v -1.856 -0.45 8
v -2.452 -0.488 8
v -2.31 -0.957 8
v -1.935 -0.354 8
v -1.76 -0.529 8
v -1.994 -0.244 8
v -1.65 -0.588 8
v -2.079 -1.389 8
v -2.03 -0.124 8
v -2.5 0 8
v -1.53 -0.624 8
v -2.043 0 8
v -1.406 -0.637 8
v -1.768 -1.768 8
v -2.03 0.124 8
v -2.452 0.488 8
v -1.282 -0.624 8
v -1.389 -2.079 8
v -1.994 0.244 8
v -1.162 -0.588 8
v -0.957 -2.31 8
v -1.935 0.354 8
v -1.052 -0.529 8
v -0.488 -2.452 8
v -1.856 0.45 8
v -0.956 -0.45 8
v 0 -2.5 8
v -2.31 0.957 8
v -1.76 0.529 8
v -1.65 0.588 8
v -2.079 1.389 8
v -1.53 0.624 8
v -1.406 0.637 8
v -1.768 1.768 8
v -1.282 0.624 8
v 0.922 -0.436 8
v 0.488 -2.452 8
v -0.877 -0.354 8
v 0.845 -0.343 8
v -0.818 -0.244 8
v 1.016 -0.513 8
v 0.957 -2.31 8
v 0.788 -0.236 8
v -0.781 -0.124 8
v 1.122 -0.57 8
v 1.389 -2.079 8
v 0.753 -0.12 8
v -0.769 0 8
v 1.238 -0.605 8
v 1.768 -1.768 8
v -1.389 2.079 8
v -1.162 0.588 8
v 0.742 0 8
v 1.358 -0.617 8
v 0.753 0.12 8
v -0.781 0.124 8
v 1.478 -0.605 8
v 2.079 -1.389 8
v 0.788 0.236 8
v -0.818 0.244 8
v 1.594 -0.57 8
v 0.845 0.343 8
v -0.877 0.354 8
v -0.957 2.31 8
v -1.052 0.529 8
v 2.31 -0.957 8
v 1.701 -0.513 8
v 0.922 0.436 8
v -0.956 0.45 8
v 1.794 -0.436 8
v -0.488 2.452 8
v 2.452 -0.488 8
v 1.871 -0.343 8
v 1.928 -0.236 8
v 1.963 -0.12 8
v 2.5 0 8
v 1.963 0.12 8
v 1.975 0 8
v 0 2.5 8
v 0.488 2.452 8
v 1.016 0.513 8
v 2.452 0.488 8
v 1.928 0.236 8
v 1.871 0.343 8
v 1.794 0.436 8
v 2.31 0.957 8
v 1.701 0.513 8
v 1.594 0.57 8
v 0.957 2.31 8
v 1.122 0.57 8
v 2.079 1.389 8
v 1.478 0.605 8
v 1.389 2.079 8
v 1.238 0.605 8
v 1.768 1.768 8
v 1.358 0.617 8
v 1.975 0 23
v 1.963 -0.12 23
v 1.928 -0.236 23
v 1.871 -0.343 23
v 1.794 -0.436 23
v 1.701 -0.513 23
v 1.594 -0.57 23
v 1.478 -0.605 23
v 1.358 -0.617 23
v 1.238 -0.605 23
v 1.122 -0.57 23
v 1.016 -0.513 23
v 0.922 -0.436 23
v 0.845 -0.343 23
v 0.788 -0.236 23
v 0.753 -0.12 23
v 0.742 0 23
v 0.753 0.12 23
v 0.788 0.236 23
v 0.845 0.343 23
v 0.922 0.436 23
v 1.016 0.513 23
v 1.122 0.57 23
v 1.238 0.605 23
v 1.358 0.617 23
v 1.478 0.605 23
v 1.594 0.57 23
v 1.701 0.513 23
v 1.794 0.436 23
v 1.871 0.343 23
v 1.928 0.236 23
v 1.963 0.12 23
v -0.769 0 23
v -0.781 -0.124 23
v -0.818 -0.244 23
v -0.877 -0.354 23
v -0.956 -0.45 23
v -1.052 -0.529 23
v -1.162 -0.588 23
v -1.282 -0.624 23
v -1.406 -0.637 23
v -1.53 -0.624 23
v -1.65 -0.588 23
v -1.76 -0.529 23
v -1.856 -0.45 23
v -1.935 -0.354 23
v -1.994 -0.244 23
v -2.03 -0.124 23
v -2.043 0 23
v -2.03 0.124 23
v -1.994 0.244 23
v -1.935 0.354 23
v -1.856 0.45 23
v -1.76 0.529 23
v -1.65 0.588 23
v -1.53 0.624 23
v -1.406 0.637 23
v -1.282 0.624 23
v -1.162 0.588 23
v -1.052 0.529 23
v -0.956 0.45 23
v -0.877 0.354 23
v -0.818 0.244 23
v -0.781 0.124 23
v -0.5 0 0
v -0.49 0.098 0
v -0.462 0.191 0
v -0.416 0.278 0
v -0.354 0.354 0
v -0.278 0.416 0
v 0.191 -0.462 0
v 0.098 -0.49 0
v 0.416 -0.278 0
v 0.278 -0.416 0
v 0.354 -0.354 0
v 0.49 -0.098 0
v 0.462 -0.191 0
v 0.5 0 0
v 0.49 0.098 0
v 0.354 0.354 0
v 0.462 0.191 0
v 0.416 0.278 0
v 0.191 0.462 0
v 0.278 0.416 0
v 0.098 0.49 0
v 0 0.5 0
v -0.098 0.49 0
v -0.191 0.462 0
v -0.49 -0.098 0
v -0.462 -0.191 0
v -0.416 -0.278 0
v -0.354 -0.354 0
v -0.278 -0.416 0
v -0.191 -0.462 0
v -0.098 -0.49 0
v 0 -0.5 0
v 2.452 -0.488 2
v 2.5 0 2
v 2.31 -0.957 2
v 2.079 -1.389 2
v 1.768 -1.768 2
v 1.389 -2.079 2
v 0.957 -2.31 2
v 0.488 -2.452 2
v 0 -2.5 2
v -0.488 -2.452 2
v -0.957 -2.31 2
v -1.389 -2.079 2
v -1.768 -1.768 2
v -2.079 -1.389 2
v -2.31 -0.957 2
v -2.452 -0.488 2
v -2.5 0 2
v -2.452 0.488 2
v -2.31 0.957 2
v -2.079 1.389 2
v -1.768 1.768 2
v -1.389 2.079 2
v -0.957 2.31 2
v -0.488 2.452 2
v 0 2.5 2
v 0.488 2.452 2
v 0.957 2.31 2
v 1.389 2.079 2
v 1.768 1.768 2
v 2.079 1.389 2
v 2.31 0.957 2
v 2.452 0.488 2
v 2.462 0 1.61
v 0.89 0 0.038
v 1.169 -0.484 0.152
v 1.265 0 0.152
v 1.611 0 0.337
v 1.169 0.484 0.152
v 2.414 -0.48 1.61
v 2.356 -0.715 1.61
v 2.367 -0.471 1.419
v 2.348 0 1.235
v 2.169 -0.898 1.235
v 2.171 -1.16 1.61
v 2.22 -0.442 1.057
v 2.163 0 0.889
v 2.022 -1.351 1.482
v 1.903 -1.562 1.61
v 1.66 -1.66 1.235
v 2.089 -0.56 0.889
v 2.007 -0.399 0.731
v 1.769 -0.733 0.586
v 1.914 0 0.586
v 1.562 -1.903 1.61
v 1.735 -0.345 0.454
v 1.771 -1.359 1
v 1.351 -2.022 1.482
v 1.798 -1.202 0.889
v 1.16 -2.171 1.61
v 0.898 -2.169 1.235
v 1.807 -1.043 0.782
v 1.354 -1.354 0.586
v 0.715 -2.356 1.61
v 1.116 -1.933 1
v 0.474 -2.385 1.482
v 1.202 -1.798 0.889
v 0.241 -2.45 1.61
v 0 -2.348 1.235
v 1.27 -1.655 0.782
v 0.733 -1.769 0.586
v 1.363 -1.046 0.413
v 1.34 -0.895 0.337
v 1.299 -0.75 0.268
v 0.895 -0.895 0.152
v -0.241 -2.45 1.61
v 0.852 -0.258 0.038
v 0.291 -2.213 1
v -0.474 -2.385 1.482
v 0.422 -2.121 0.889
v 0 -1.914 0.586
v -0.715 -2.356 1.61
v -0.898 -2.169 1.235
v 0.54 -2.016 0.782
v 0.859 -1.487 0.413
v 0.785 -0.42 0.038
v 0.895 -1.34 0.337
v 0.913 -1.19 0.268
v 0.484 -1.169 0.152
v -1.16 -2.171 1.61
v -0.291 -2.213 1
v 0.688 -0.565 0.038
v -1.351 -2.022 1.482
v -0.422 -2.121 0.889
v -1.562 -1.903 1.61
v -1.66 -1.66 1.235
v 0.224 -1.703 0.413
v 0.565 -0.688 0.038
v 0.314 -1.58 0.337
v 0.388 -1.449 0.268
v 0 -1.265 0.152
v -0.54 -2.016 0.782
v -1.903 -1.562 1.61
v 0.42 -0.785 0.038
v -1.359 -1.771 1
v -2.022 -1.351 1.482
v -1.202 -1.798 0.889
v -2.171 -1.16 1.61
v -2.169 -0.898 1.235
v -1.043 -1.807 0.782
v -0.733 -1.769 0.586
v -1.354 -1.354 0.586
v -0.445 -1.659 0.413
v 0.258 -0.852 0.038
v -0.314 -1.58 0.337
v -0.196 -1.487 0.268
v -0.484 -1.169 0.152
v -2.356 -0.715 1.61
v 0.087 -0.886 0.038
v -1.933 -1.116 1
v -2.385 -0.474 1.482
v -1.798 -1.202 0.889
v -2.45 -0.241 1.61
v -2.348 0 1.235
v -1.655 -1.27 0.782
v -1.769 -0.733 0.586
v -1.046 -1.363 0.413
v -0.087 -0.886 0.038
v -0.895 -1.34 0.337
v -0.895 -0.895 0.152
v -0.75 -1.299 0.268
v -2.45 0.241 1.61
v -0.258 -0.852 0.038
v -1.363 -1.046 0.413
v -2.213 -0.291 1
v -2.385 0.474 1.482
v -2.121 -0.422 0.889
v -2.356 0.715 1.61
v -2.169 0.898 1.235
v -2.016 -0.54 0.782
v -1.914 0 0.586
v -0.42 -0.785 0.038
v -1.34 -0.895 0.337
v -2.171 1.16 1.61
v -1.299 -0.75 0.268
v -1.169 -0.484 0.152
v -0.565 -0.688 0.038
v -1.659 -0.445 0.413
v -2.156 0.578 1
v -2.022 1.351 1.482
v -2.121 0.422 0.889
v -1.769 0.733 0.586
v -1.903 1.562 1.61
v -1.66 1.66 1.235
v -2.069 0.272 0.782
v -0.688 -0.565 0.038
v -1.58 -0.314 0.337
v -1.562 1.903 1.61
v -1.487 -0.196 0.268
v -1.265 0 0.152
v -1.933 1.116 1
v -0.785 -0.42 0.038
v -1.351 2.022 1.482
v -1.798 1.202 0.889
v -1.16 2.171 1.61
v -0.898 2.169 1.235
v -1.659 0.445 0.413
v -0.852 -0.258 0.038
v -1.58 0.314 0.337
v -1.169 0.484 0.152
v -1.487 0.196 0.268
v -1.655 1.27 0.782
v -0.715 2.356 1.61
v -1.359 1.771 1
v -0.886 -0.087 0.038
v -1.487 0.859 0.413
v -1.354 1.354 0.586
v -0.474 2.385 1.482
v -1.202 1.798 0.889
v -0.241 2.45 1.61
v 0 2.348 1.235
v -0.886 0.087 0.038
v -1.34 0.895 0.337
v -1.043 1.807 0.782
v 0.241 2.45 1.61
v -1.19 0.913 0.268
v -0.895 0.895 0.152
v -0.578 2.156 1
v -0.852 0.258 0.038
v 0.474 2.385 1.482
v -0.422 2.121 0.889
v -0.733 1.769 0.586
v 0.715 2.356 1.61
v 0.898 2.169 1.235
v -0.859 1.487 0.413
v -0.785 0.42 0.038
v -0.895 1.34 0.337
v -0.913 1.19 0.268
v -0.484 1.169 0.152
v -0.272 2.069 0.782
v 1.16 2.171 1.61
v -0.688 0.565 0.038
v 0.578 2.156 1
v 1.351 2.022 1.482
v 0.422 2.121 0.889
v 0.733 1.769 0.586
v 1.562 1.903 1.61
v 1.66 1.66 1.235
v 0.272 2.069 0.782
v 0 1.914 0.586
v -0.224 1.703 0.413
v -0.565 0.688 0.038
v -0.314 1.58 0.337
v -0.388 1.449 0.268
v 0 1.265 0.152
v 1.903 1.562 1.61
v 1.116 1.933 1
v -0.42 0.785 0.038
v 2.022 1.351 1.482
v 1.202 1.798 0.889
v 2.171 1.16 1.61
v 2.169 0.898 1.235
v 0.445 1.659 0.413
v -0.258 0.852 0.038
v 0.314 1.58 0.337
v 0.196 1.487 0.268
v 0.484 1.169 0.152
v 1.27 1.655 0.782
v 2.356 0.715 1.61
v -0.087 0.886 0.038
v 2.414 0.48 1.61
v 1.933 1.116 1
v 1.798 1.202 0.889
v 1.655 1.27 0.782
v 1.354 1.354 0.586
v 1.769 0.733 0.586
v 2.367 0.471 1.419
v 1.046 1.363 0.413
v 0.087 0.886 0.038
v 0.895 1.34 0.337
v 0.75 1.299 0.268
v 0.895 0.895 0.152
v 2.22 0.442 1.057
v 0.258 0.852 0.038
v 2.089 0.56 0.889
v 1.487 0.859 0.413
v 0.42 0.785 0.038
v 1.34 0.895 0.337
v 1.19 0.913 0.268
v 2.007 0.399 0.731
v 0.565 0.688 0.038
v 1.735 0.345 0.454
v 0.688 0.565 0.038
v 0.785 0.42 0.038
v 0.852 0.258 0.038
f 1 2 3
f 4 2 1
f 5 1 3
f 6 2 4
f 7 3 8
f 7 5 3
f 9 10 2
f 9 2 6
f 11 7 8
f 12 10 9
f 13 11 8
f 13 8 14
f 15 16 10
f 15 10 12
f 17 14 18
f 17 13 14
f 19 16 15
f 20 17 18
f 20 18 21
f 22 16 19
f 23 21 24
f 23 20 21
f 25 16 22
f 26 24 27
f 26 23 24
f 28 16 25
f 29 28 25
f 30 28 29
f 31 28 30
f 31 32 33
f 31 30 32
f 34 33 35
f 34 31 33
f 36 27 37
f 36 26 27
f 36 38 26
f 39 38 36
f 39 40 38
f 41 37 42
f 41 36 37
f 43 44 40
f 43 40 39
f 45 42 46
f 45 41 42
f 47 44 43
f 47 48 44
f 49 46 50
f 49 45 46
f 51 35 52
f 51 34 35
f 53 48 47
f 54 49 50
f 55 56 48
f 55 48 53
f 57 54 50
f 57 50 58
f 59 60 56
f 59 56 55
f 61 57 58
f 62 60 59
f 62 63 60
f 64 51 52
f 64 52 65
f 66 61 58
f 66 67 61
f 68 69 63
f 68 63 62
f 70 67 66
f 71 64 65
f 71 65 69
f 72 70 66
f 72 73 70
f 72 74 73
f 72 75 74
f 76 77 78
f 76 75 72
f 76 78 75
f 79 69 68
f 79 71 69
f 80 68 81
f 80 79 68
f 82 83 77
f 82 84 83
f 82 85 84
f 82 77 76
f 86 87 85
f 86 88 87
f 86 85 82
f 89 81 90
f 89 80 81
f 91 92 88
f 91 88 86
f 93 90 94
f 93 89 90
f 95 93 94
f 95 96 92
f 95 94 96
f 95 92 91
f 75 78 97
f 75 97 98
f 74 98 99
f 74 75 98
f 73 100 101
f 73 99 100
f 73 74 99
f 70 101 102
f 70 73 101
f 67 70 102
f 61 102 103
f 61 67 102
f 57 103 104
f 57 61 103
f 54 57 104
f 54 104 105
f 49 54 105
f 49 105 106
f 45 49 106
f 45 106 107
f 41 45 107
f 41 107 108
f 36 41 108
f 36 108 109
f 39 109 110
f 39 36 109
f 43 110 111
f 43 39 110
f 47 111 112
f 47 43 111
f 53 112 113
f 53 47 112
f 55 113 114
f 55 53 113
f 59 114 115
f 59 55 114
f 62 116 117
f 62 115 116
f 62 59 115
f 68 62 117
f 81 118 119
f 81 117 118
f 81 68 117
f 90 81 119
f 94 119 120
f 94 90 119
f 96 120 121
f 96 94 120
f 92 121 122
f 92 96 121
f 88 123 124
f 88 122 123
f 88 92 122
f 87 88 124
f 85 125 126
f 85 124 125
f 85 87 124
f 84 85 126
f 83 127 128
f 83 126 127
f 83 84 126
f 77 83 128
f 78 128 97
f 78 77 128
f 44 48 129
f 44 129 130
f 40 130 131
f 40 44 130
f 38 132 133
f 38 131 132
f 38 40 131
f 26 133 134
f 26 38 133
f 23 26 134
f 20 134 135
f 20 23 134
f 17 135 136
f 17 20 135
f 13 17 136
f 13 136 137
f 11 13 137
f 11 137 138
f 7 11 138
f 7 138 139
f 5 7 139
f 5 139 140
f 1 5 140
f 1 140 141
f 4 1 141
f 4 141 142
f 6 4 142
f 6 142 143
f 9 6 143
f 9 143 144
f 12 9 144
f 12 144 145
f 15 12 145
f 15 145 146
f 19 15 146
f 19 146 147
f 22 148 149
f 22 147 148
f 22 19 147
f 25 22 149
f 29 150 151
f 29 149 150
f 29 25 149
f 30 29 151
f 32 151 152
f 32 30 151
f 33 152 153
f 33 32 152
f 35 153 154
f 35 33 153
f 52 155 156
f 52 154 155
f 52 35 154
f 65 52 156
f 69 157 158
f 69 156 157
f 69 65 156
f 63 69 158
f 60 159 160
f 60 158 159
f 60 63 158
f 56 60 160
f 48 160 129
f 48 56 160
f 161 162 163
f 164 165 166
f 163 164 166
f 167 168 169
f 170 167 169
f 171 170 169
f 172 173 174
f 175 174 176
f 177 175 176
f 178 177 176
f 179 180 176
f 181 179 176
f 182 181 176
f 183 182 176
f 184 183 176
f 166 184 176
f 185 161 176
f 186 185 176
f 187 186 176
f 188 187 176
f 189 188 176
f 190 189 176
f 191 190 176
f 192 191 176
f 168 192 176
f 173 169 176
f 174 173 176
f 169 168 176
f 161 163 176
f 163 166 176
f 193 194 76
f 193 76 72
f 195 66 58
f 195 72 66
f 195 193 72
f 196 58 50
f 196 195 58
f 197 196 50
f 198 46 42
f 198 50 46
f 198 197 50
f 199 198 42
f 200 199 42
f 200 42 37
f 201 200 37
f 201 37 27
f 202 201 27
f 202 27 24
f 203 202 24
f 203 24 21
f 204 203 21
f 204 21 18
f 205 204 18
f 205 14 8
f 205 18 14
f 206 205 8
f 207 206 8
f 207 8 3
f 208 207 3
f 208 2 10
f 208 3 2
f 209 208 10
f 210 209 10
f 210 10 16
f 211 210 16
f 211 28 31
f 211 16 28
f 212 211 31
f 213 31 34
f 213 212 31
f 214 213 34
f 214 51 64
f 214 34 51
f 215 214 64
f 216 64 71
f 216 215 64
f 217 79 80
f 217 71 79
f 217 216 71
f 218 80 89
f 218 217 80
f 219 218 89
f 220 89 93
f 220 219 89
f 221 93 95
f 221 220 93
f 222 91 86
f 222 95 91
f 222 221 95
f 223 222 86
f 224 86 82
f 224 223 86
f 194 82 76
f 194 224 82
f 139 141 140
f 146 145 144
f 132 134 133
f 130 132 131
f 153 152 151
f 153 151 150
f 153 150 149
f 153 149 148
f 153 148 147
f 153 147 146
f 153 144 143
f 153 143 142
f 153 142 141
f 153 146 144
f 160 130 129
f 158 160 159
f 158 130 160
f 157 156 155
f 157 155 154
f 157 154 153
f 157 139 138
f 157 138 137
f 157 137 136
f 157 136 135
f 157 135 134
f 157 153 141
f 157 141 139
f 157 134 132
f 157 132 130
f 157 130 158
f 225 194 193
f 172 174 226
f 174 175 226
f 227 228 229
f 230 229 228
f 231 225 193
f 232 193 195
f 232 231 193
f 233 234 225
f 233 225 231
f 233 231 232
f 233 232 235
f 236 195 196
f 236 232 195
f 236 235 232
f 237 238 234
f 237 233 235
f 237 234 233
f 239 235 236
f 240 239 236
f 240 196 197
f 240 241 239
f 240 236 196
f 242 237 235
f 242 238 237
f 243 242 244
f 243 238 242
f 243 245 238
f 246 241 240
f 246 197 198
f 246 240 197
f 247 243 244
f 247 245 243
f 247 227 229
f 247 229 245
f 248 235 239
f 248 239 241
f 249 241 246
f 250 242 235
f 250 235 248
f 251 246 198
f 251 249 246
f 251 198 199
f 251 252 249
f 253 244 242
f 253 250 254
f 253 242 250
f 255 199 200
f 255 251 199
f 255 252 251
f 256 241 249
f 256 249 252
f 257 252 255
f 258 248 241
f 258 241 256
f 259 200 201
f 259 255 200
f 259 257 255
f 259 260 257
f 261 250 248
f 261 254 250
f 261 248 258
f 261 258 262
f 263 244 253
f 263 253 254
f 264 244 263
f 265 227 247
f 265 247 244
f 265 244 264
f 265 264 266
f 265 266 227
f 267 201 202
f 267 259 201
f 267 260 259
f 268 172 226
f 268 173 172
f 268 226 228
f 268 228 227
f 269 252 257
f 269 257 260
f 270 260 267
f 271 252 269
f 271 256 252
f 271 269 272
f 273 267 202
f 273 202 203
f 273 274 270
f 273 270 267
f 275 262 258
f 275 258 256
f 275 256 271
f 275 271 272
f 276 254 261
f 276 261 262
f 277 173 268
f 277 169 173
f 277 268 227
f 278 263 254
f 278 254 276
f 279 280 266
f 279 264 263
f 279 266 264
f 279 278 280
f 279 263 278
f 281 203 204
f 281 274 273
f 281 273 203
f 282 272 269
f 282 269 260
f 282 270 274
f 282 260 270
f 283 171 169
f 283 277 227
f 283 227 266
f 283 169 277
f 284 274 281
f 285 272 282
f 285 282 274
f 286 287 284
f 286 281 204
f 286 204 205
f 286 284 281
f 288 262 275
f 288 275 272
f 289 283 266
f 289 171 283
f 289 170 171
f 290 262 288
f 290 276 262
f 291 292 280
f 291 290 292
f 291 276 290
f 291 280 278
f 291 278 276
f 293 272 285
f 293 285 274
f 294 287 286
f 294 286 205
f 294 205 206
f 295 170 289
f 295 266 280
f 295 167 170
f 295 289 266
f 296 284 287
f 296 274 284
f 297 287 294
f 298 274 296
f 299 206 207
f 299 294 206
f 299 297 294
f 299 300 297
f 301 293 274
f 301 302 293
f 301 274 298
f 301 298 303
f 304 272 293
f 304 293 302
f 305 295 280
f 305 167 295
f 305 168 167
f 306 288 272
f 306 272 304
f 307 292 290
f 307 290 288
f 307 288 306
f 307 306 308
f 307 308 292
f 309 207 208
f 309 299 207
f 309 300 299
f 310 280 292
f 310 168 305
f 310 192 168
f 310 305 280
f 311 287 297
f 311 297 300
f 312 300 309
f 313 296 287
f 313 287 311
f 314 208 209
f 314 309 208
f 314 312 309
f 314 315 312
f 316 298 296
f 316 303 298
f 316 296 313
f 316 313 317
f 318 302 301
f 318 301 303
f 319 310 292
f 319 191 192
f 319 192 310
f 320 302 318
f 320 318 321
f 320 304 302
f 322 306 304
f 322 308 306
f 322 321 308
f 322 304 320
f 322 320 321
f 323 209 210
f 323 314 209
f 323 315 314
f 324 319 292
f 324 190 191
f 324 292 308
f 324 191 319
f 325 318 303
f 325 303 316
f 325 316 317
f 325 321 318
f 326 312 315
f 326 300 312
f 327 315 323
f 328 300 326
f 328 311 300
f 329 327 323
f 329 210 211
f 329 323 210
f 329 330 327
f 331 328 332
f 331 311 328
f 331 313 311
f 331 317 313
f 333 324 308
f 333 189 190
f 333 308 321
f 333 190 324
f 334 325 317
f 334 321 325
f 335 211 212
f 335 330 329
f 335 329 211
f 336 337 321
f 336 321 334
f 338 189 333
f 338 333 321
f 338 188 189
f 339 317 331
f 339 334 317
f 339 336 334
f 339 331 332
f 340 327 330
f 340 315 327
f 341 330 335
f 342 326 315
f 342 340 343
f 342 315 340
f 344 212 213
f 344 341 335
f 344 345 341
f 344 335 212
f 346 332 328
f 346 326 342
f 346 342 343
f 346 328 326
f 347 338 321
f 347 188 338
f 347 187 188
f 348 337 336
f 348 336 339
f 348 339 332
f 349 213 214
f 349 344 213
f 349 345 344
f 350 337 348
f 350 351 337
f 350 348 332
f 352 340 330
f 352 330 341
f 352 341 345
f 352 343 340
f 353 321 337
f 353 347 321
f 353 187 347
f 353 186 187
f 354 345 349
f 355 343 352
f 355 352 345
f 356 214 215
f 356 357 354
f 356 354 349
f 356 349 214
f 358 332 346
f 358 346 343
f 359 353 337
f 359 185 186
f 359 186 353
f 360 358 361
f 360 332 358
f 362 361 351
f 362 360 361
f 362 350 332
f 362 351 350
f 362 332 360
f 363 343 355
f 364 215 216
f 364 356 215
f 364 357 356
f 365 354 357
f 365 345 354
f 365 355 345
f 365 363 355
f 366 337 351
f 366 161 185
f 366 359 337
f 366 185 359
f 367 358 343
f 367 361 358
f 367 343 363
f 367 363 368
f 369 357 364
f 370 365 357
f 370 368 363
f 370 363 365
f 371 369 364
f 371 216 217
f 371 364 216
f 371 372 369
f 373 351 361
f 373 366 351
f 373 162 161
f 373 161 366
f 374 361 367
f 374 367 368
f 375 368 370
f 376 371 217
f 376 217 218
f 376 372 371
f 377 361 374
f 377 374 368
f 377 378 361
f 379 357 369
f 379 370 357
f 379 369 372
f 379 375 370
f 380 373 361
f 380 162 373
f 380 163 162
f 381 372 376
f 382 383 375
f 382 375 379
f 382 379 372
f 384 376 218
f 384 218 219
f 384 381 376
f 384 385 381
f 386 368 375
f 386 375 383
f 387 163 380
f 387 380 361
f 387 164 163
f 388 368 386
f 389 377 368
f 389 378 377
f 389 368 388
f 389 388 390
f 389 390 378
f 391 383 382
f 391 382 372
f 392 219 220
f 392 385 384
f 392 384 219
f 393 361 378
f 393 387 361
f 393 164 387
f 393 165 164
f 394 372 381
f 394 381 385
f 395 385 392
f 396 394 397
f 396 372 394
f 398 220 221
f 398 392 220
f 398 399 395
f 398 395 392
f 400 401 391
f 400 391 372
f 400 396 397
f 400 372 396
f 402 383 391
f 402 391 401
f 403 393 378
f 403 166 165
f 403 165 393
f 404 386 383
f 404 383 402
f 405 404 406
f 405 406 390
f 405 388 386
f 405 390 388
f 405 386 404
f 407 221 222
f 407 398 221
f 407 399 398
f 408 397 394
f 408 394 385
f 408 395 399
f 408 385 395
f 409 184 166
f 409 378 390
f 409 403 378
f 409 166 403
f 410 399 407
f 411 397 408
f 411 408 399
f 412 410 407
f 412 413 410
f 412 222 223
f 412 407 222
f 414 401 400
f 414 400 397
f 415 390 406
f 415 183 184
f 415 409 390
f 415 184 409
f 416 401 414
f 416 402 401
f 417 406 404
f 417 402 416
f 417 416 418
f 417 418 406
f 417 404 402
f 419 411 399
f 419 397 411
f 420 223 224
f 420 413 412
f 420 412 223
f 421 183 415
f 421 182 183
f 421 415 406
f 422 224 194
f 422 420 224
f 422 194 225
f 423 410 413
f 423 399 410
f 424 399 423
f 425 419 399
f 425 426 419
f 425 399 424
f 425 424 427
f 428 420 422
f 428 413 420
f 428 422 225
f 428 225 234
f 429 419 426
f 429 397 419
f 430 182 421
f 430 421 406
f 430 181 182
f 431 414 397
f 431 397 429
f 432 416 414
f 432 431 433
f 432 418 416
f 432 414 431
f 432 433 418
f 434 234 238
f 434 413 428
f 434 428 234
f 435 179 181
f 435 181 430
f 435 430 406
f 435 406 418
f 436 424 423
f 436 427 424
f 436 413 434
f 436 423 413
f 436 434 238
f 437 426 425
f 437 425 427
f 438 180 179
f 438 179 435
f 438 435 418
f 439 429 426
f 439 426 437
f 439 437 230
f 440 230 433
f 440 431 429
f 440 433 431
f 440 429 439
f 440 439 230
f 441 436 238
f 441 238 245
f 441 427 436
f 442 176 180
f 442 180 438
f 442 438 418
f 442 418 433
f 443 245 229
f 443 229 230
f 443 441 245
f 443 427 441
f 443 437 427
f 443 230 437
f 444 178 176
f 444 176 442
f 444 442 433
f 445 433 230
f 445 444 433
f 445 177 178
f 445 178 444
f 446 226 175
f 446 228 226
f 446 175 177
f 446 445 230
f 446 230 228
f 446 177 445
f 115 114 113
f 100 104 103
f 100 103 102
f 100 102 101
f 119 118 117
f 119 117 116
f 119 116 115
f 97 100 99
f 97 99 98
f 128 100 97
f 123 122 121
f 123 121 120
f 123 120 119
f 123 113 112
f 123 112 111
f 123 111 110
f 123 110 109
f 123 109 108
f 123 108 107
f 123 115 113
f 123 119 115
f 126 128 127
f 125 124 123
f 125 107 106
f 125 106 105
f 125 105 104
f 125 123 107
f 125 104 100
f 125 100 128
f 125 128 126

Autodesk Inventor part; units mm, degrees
ref_plane "YZ Plane" through (0, 0, 0) normal (1, 0, 0) x (0, 1, 0)
ref_plane "XZ Plane" through (0, 0, 0) normal (0, 1, 0) x (-1, 0, 0)
ref_plane "XY Plane" through (0, 0, 0) normal (0, 0, 1) x (1, 0, 0)
sketch "Sketch1" plane through (0, 0, 0) normal (0, 0, 1) x (1, 0, 0)
  circle A0 centre (0, 0) radius 2.5
  dimension "d0" = 5
extrude "Extrusion1" add sketch "Sketch1" along normal blind 8
sketch "Sketch2" plane through (0, 0, 8) normal (0, 0, 1) x (1, 0, 0)
  circle A0 centre (1.3581, 0) radius 0.6166
  circle A1 centre (-1.4059, 0) radius 0.6367
  point P0 (0, 0)
extrude "Extrusion2" add sketch "Sketch2" along normal blind 15
fillet "Fillet1" radius 2 1 edges at (-2.5, 0, 0)
properties part number "5mm_led"
